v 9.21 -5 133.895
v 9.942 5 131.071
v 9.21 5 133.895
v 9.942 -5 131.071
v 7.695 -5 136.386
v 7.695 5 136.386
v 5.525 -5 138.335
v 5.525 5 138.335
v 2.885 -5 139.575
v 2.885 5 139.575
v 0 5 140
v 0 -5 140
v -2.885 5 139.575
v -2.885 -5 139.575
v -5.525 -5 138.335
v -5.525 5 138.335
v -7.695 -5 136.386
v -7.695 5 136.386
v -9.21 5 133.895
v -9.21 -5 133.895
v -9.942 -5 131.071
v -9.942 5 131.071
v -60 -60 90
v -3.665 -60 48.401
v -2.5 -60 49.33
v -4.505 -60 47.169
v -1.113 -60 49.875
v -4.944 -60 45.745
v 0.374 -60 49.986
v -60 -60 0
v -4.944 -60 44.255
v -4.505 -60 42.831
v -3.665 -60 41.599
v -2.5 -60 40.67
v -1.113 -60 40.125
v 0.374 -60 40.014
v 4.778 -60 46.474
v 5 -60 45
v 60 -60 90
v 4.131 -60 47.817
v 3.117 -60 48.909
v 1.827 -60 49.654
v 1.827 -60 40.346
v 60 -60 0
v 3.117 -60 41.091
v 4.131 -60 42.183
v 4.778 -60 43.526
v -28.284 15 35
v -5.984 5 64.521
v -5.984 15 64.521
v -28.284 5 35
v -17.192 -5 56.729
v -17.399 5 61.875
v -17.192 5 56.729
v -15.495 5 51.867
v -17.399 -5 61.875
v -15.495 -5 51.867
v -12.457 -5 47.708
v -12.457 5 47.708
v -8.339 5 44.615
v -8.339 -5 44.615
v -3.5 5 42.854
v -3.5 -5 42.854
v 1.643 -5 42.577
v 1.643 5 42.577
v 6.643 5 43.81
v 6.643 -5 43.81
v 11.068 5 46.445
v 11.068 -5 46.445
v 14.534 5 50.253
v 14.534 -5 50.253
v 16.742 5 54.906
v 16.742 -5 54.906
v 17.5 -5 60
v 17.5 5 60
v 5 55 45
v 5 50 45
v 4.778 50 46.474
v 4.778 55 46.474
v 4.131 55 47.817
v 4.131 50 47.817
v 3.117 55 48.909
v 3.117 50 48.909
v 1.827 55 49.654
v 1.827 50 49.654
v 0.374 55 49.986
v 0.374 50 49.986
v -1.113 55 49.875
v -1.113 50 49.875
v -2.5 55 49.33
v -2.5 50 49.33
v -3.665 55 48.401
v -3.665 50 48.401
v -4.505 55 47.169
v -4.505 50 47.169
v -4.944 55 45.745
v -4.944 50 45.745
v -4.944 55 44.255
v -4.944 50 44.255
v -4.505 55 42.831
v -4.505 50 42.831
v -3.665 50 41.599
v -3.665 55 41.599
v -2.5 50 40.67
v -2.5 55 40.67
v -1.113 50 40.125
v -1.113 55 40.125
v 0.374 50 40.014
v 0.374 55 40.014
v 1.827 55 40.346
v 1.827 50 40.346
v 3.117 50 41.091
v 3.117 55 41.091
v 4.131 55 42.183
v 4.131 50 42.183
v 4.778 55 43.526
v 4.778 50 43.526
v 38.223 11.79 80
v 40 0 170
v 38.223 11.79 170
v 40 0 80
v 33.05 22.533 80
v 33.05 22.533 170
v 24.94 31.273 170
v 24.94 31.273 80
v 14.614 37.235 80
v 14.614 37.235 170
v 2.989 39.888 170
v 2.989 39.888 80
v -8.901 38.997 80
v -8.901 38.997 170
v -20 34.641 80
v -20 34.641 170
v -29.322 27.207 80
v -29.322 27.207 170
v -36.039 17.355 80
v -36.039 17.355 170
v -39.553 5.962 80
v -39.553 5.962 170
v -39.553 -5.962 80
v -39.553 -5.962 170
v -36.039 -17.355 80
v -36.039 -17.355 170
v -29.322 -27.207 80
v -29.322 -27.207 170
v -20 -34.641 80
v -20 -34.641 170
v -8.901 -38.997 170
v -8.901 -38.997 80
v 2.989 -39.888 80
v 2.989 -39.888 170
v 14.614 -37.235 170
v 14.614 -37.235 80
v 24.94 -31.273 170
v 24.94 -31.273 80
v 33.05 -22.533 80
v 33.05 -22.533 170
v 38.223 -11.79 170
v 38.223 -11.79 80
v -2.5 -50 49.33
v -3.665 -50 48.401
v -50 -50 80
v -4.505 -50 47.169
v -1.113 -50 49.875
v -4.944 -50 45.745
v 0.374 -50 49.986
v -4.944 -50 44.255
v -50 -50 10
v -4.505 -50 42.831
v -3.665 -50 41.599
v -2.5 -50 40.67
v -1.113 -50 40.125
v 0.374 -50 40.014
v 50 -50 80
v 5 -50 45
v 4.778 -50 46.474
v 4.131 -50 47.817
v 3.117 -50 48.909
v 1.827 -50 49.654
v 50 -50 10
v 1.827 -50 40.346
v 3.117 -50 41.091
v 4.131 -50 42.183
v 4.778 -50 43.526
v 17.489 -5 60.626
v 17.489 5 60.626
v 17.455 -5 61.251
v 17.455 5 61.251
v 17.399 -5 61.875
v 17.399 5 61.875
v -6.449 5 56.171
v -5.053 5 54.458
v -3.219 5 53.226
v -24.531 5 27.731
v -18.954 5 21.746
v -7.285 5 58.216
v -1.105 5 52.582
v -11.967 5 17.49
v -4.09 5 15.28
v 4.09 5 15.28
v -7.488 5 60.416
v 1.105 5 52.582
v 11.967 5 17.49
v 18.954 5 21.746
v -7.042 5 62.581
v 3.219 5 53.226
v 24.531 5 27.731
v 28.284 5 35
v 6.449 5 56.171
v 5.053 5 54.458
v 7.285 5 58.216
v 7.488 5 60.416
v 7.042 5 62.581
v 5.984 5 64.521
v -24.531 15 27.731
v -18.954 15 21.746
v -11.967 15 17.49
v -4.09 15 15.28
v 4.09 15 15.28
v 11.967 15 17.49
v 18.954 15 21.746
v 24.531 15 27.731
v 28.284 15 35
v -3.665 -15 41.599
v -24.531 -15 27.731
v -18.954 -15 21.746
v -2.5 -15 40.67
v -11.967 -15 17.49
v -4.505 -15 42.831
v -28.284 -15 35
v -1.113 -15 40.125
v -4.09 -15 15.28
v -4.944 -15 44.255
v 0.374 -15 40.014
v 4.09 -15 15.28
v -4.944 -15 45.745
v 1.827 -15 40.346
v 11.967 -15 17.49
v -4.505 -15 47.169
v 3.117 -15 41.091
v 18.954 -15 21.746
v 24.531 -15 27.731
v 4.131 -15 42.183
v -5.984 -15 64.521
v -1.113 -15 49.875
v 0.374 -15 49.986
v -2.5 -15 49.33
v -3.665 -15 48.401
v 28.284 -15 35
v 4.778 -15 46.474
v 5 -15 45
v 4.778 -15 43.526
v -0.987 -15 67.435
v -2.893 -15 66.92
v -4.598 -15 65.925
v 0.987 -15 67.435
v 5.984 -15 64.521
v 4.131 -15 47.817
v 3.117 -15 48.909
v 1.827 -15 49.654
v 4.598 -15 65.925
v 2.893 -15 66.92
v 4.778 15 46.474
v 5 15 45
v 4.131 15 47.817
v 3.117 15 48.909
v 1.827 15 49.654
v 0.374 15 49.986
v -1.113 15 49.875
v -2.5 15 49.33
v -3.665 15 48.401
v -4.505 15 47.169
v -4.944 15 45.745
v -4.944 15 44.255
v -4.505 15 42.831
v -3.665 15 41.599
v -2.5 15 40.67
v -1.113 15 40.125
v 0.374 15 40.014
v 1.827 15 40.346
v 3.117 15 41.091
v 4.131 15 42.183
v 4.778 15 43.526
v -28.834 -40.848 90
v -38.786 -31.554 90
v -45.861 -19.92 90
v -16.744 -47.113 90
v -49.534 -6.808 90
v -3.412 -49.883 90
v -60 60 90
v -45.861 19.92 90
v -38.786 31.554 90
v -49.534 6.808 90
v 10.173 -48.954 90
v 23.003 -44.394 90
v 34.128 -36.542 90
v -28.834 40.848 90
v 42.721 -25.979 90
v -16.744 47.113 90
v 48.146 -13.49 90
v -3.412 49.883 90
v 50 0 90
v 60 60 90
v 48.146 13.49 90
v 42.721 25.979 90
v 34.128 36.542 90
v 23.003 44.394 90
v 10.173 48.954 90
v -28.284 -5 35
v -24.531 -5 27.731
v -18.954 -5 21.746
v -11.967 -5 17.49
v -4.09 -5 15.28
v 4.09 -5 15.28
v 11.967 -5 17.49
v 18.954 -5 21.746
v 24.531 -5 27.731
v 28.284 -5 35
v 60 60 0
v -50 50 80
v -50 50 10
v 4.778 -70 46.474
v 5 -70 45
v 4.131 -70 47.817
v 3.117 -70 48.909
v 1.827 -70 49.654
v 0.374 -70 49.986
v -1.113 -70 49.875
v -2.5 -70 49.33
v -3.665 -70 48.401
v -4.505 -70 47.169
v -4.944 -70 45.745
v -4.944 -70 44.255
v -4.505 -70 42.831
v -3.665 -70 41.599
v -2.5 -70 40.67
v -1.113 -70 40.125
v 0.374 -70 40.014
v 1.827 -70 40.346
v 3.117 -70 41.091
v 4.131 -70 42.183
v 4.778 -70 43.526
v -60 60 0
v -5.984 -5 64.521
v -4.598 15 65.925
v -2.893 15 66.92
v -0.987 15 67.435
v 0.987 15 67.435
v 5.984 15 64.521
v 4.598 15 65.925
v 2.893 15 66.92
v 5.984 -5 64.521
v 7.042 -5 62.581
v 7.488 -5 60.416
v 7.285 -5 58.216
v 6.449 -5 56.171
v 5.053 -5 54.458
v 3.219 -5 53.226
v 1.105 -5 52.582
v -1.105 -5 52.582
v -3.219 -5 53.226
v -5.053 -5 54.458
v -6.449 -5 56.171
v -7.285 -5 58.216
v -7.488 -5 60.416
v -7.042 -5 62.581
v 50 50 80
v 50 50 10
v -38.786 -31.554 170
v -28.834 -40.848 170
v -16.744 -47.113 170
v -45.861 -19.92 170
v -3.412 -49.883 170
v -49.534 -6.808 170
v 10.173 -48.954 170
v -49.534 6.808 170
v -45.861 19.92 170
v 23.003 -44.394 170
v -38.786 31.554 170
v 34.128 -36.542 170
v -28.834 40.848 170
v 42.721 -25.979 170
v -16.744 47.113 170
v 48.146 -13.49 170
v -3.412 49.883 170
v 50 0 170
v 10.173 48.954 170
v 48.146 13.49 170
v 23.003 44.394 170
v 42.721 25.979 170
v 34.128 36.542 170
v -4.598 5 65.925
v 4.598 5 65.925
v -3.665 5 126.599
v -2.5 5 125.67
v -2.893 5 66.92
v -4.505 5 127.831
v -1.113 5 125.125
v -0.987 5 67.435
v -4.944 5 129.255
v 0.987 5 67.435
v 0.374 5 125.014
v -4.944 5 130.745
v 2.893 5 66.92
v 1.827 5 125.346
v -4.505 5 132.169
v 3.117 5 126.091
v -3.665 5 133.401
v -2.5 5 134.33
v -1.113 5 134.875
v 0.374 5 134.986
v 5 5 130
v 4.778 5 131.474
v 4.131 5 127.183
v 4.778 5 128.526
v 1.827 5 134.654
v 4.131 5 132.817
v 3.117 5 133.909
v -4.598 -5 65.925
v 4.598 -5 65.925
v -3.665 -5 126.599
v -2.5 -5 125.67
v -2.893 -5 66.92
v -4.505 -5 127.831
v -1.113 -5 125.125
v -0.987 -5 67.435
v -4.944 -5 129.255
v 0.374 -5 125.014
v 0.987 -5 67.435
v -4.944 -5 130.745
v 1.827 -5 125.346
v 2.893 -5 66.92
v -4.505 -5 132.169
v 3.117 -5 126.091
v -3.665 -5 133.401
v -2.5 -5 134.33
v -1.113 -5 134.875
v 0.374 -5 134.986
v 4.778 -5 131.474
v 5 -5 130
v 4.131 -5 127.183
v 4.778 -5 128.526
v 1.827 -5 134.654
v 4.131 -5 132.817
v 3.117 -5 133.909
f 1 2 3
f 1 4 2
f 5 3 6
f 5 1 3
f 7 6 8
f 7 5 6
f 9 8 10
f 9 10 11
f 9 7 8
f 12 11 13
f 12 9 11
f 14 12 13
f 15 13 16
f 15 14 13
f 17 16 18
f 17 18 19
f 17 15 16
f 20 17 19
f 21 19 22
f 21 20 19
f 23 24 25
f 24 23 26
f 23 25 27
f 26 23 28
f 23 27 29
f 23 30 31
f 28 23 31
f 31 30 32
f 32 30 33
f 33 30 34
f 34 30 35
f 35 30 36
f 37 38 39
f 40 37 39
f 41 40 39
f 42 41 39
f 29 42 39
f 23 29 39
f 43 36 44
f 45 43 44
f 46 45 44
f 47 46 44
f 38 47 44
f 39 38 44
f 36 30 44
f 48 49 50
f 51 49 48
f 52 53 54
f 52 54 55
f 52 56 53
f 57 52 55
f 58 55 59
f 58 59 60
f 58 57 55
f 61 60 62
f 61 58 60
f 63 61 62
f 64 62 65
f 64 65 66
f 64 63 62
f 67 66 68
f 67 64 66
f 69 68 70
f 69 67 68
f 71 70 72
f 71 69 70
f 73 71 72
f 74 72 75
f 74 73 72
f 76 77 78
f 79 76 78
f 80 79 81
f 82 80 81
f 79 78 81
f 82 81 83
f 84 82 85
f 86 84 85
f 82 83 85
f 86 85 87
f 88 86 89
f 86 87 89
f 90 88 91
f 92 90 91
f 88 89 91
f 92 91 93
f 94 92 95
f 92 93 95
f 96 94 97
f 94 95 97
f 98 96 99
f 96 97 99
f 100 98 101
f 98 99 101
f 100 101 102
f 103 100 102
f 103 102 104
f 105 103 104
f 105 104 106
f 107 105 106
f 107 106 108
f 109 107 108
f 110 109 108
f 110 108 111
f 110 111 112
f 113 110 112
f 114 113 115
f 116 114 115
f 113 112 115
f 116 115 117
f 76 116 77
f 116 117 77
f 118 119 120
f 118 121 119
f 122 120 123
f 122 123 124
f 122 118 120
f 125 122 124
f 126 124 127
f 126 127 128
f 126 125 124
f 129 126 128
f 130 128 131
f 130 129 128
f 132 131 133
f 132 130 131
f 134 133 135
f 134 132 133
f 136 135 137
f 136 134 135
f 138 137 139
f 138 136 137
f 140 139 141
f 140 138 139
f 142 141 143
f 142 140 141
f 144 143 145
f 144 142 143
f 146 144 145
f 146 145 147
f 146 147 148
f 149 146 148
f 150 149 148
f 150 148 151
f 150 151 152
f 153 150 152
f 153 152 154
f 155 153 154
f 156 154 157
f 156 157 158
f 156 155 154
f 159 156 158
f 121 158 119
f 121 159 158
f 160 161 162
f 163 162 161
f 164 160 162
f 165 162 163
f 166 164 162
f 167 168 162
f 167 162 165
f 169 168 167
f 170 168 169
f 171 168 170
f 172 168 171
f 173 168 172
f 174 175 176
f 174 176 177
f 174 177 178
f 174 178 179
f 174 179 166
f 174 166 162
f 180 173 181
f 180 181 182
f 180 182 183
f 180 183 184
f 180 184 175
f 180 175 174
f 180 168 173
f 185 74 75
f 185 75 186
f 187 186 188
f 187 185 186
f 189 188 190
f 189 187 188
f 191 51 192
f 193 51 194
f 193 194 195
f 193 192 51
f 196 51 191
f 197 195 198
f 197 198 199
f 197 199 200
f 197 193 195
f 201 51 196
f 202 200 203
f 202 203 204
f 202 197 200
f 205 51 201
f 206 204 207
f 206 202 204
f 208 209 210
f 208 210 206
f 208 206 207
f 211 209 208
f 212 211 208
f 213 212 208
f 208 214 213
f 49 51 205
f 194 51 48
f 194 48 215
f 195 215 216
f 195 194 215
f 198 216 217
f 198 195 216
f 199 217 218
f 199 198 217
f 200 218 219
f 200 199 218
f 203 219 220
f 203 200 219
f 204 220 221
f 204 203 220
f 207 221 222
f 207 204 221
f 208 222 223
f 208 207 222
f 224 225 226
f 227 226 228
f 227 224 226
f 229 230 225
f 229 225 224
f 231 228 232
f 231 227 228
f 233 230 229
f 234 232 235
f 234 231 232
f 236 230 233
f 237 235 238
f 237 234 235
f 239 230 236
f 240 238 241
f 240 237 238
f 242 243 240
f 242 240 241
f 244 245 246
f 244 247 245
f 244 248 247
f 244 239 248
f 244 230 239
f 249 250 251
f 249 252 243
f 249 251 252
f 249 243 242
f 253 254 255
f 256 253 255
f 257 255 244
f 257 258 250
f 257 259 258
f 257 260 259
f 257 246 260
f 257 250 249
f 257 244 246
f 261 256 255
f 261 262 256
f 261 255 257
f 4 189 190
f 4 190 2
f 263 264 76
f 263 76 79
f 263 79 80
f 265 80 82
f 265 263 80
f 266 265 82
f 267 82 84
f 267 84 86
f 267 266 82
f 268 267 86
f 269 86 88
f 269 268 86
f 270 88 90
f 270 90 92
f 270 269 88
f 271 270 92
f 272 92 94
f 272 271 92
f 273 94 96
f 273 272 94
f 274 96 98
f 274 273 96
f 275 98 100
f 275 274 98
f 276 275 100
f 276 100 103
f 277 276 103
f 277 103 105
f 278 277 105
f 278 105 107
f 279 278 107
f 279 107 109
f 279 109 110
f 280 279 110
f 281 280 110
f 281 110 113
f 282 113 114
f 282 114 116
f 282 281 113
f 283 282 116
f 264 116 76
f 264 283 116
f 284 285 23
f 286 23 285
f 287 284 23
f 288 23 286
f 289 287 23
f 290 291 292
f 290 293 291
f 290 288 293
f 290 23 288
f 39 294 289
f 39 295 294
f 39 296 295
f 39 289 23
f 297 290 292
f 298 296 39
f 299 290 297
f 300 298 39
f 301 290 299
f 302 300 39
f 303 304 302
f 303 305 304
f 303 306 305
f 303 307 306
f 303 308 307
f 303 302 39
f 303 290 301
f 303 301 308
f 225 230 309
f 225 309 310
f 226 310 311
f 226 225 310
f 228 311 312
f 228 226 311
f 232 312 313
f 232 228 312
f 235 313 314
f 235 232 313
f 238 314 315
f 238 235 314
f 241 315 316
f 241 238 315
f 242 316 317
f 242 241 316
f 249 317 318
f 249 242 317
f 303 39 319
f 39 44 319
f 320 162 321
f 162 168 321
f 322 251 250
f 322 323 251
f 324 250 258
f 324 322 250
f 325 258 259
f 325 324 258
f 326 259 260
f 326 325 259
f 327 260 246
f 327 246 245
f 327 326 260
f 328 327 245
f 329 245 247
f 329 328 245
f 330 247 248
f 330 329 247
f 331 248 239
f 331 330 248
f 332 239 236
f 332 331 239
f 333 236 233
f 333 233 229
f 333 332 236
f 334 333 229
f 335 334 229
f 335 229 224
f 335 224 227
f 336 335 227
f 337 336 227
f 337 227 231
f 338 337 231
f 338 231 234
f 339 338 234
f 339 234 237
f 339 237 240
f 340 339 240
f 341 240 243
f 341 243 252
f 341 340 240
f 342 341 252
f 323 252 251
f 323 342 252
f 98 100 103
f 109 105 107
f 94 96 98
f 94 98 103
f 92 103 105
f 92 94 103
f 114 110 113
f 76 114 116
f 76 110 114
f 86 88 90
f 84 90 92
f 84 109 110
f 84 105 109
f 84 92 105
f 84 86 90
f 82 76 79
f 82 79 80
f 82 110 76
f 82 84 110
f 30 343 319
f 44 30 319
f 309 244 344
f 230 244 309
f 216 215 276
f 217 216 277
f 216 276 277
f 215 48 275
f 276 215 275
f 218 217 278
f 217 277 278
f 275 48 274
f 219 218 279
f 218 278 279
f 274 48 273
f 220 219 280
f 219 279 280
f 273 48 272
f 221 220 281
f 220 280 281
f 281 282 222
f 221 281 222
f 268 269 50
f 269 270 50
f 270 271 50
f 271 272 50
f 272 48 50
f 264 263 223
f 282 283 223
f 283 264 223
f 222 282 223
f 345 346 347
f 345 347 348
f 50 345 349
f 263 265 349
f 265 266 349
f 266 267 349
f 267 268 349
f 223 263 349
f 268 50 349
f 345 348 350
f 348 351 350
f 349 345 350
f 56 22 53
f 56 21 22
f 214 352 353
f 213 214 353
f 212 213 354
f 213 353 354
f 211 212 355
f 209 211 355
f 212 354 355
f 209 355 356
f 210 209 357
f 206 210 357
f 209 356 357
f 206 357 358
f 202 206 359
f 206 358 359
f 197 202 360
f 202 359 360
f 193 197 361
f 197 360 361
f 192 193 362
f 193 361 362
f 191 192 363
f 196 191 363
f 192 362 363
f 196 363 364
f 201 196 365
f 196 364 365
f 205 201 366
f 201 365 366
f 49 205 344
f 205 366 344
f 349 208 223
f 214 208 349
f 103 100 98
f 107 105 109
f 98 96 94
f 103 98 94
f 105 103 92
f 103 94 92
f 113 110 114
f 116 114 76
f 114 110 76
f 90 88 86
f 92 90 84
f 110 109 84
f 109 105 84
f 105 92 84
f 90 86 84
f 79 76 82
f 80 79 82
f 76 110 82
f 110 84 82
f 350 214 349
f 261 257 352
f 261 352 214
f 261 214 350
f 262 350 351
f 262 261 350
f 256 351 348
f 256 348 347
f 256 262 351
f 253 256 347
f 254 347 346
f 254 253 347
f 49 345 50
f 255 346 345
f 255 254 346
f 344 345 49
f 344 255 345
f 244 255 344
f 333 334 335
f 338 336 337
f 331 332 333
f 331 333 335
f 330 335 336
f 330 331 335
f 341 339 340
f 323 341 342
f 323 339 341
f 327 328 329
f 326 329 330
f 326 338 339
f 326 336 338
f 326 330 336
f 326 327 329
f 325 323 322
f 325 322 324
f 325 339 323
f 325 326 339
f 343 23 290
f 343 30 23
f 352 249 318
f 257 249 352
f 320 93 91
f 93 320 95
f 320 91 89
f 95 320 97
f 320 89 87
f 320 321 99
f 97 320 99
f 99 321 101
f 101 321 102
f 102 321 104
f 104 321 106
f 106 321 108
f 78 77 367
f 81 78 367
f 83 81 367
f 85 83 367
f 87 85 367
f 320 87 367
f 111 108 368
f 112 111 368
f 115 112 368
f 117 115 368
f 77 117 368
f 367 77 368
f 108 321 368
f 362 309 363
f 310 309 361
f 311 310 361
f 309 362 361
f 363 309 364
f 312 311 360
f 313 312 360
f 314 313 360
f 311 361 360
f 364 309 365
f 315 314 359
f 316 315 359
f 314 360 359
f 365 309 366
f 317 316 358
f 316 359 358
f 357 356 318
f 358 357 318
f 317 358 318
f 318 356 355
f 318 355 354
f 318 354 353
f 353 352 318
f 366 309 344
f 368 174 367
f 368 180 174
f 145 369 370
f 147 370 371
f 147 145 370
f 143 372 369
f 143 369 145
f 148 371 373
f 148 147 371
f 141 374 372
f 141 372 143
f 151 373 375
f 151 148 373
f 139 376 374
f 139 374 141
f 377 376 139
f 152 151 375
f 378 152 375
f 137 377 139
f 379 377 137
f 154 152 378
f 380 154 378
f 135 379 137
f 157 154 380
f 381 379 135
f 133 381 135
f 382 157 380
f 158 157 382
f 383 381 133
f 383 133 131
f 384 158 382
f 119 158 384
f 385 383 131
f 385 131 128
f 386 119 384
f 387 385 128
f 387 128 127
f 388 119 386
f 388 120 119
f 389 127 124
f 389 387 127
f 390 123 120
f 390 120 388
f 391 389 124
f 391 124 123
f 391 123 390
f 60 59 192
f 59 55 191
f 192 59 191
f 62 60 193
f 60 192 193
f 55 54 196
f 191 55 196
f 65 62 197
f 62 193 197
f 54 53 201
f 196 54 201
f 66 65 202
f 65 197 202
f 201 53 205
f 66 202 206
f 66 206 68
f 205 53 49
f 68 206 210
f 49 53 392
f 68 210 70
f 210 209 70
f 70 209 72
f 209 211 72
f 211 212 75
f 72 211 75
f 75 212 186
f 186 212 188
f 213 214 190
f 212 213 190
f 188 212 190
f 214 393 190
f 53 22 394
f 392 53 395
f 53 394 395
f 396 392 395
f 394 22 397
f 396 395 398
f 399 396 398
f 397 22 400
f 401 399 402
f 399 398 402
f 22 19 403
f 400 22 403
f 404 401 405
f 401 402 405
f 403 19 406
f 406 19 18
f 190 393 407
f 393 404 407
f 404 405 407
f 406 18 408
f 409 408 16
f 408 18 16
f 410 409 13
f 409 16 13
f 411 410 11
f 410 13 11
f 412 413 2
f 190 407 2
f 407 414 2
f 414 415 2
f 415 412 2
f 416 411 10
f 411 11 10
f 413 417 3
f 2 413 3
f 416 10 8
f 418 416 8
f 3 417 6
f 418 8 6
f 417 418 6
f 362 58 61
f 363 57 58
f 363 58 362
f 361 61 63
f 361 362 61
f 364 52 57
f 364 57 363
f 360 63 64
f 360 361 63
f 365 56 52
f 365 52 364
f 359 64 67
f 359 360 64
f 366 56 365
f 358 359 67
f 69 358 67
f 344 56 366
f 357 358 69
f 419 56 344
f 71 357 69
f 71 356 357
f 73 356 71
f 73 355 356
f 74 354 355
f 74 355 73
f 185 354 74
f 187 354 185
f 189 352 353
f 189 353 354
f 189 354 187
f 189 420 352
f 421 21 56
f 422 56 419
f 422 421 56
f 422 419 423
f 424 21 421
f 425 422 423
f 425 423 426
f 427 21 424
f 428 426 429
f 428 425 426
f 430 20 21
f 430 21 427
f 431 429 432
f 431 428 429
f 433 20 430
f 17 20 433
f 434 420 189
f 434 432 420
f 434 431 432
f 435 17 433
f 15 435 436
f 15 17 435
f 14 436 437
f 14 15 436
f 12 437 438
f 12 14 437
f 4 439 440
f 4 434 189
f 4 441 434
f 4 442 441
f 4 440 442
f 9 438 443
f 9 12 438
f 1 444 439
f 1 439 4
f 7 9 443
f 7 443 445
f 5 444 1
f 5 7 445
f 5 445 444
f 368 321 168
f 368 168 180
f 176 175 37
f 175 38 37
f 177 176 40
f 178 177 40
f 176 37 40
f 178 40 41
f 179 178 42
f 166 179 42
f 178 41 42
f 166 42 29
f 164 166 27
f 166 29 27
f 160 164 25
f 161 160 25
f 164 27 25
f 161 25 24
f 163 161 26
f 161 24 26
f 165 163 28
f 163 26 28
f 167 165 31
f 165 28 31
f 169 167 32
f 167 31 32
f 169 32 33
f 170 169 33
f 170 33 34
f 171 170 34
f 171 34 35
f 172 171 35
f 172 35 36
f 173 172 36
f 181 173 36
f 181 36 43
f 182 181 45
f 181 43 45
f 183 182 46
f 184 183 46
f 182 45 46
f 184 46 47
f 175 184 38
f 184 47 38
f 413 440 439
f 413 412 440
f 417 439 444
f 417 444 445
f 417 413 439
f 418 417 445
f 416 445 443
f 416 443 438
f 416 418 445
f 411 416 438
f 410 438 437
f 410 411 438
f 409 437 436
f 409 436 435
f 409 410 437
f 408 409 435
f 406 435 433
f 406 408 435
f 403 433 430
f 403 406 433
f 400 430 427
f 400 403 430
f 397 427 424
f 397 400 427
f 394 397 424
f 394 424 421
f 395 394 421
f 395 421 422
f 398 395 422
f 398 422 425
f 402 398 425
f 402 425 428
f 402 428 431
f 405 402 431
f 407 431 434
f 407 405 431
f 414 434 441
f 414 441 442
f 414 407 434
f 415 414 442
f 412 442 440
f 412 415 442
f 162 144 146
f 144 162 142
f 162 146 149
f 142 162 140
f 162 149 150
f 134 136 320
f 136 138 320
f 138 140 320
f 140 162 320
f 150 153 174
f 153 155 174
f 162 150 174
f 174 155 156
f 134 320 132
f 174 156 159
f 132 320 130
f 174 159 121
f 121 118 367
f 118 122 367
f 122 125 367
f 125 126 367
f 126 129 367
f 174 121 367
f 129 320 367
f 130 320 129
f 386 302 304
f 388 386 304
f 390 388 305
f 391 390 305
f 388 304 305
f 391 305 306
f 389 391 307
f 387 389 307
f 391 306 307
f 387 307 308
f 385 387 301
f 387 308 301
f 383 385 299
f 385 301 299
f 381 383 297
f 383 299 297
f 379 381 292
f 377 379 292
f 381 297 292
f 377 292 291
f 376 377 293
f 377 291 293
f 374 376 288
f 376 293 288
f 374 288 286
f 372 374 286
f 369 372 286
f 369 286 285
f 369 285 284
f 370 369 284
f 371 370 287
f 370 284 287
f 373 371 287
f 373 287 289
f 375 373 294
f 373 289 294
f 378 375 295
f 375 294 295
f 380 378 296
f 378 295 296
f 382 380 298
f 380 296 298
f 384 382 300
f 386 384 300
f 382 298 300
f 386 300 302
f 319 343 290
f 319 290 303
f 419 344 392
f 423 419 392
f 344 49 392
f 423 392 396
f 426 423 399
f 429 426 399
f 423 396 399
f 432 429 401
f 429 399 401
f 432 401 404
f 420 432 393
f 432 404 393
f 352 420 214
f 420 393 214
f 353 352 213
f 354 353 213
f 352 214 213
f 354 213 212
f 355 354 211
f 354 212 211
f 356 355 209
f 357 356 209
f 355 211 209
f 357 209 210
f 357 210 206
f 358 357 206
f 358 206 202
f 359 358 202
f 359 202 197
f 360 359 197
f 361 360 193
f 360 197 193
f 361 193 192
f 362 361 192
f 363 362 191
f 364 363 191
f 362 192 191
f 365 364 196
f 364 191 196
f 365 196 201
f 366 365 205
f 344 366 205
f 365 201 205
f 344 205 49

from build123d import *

# Parameters (mm, degrees)
F0_W          = 120
F0_H          = 120
F1_DEPTH      = 80
F2_T          = -10
F3_R          = 5
F4_DEPTH      = 70
F4_DEPTH_BACK = 55
F7_DEPTH      = 15
F9_DEPTH      = 5
F10_R         = 5
F11_DEPTH     = 5
F12_W         = 120
F12_H         = 120
F12_R         = 40
F13_DEPTH     = 10
F14_R         = 50
F14_R_2       = 40
F15_DEPTH     = 80


with BuildPart() as f1:
    # F0 (on Top) → F1 (new body)
    with BuildSketch(Plane.XY):
        Rectangle(F0_W, F0_H)
    extrude(amount=F1_DEPTH)

    # F2
    f2_openings = [f1.faces().sort_by_distance(p)[0] for p in [
        (0, 0, 80),
    ]]
    offset(amount=F2_T, openings=f2_openings)


with BuildPart() as f4:
    # F3 (on Front) → F4 (new body, two sides)
    with BuildSketch(Plane.XZ) as f4_sk:
        with Locations((0, 45)):
            Circle(F3_R)
    extrude(amount=F4_DEPTH)
    extrude(f4_sk.sketch, amount=-F4_DEPTH_BACK)


with BuildPart() as f1_1:
    add(f1.part)

    # F5: cut F4
    add(f4.part, mode=Mode.SUBTRACT)

    # F12 (on face) → F13 (join)
    with BuildSketch(Plane.XY.offset(80)):
        Rectangle(F12_W, F12_H)
        Circle(F12_R, mode=Mode.SUBTRACT)
    extrude(amount=F13_DEPTH)

    # F14 (on face) → F15 (join)
    with BuildSketch(Plane.XY.offset(90)):
        Circle(F14_R)
        Circle(F14_R_2, mode=Mode.SUBTRACT)
    extrude(amount=F15_DEPTH)


with BuildPart() as f4_1:
    add(f4.part)

    # F6 (on Front) → F7 (join, symmetric)
    with BuildSketch(Plane.XZ):
        with BuildLine():
            Line((-5.9844609002, 64.5206446149), (-28.2842712475, 35))
            ThreePointArc((-28.2842712475, 35), (0, 15), (28.2842712475, 35))
            Line((28.2842712475, 35), (5.9844609002, 64.5206446149))
            ThreePointArc((5.9844609002, 64.5206446149), (7.111028644, 62.3839613303), (7.5, 60))
            ThreePointArc((7.5, 60), (-2.3839613303, 52.888971356), (-5.9844609002, 64.5206446149))
        make_face()
        with BuildLine():
            ThreePointArc((5.9844609002, 64.5206446149), (0, 67.5), (-5.9844609002, 64.5206446149))
            ThreePointArc((-5.9844609002, 64.5206446149), (-2.3839613303, 52.888971356), (7.5, 60))
            ThreePointArc((7.5, 60), (7.111028644, 62.3839613303), (5.9844609002, 64.5206446149))
        make_face()
    extrude(amount=F7_DEPTH, both=True)

    # F8 (on Front) → F9 (cut, symmetric)
    with BuildSketch(Plane.XZ):
        with BuildLine():
            ThreePointArc((-28.2842712475, 35), (0, 15), (28.2842712475, 35))
            Line((28.2842712475, 35), (5.9844609002, 64.5206446149))
            ThreePointArc((5.9844609002, 64.5206446149), (0, 52.5), (-5.9844609002, 64.5206446149))
            Line((-5.9844609002, 64.5206446149), (-28.2842712475, 35))
        make_face()
    extrude(amount=F9_DEPTH, both=True, mode=Mode.SUBTRACT)


with BuildPart() as f11:
    # F10 (on Front) → F11 (new body, symmetric)
    with BuildSketch(Plane.XZ):
        with BuildLine():
            ThreePointArc((-17.3992636338, 61.875), (-0.9388520671, 42.5252022388), (17.5, 60))
            ThreePointArc((17.5, 60), (17.4747977612, 60.9388520671), (17.3992636338, 61.875))
            ThreePointArc((17.3992636338, 61.875), (0, 77.5), (-17.3992636338, 61.875))
        make_face()
        with BuildLine():
            ThreePointArc((-5.9844609002, 64.5206446149), (0, 67.5), (5.9844609002, 64.5206446149))
            ThreePointArc((5.9844609002, 64.5206446149), (0, 52.5), (-5.9844609002, 64.5206446149))
        make_face(mode=Mode.SUBTRACT)
        with BuildLine():
            ThreePointArc((-17.3992636338, 61.875), (0, 77.5), (17.3992636338, 61.875))
            Line((17.3992636338, 61.875), (9.9424363622, 131.0714285714))
            ThreePointArc((9.9424363622, 131.0714285714), (9.9855987207, 130.5364868955), (10, 130))
            ThreePointArc((10, 130), (-0.5364868955, 120.0144012793), (-9.9424363622, 131.0714285714))
            Line((-9.9424363622, 131.0714285714), (-17.3992636338, 61.875))
        make_face()
        with BuildLine():
            ThreePointArc((10, 130), (9.9855987207, 130.5364868955), (9.9424363622, 131.0714285714))
            ThreePointArc((9.9424363622, 131.0714285714), (0, 140), (-9.9424363622, 131.0714285714))
            ThreePointArc((-9.9424363622, 131.0714285714), (-0.5364868955, 120.0144012793), (10, 130))
        make_face()
        with Locations((0, 130)):
            Circle(F10_R, mode=Mode.SUBTRACT)
    extrude(amount=F11_DEPTH, both=True)


solid = Compound([f1_1.part, f4_1.part, f11.part])
